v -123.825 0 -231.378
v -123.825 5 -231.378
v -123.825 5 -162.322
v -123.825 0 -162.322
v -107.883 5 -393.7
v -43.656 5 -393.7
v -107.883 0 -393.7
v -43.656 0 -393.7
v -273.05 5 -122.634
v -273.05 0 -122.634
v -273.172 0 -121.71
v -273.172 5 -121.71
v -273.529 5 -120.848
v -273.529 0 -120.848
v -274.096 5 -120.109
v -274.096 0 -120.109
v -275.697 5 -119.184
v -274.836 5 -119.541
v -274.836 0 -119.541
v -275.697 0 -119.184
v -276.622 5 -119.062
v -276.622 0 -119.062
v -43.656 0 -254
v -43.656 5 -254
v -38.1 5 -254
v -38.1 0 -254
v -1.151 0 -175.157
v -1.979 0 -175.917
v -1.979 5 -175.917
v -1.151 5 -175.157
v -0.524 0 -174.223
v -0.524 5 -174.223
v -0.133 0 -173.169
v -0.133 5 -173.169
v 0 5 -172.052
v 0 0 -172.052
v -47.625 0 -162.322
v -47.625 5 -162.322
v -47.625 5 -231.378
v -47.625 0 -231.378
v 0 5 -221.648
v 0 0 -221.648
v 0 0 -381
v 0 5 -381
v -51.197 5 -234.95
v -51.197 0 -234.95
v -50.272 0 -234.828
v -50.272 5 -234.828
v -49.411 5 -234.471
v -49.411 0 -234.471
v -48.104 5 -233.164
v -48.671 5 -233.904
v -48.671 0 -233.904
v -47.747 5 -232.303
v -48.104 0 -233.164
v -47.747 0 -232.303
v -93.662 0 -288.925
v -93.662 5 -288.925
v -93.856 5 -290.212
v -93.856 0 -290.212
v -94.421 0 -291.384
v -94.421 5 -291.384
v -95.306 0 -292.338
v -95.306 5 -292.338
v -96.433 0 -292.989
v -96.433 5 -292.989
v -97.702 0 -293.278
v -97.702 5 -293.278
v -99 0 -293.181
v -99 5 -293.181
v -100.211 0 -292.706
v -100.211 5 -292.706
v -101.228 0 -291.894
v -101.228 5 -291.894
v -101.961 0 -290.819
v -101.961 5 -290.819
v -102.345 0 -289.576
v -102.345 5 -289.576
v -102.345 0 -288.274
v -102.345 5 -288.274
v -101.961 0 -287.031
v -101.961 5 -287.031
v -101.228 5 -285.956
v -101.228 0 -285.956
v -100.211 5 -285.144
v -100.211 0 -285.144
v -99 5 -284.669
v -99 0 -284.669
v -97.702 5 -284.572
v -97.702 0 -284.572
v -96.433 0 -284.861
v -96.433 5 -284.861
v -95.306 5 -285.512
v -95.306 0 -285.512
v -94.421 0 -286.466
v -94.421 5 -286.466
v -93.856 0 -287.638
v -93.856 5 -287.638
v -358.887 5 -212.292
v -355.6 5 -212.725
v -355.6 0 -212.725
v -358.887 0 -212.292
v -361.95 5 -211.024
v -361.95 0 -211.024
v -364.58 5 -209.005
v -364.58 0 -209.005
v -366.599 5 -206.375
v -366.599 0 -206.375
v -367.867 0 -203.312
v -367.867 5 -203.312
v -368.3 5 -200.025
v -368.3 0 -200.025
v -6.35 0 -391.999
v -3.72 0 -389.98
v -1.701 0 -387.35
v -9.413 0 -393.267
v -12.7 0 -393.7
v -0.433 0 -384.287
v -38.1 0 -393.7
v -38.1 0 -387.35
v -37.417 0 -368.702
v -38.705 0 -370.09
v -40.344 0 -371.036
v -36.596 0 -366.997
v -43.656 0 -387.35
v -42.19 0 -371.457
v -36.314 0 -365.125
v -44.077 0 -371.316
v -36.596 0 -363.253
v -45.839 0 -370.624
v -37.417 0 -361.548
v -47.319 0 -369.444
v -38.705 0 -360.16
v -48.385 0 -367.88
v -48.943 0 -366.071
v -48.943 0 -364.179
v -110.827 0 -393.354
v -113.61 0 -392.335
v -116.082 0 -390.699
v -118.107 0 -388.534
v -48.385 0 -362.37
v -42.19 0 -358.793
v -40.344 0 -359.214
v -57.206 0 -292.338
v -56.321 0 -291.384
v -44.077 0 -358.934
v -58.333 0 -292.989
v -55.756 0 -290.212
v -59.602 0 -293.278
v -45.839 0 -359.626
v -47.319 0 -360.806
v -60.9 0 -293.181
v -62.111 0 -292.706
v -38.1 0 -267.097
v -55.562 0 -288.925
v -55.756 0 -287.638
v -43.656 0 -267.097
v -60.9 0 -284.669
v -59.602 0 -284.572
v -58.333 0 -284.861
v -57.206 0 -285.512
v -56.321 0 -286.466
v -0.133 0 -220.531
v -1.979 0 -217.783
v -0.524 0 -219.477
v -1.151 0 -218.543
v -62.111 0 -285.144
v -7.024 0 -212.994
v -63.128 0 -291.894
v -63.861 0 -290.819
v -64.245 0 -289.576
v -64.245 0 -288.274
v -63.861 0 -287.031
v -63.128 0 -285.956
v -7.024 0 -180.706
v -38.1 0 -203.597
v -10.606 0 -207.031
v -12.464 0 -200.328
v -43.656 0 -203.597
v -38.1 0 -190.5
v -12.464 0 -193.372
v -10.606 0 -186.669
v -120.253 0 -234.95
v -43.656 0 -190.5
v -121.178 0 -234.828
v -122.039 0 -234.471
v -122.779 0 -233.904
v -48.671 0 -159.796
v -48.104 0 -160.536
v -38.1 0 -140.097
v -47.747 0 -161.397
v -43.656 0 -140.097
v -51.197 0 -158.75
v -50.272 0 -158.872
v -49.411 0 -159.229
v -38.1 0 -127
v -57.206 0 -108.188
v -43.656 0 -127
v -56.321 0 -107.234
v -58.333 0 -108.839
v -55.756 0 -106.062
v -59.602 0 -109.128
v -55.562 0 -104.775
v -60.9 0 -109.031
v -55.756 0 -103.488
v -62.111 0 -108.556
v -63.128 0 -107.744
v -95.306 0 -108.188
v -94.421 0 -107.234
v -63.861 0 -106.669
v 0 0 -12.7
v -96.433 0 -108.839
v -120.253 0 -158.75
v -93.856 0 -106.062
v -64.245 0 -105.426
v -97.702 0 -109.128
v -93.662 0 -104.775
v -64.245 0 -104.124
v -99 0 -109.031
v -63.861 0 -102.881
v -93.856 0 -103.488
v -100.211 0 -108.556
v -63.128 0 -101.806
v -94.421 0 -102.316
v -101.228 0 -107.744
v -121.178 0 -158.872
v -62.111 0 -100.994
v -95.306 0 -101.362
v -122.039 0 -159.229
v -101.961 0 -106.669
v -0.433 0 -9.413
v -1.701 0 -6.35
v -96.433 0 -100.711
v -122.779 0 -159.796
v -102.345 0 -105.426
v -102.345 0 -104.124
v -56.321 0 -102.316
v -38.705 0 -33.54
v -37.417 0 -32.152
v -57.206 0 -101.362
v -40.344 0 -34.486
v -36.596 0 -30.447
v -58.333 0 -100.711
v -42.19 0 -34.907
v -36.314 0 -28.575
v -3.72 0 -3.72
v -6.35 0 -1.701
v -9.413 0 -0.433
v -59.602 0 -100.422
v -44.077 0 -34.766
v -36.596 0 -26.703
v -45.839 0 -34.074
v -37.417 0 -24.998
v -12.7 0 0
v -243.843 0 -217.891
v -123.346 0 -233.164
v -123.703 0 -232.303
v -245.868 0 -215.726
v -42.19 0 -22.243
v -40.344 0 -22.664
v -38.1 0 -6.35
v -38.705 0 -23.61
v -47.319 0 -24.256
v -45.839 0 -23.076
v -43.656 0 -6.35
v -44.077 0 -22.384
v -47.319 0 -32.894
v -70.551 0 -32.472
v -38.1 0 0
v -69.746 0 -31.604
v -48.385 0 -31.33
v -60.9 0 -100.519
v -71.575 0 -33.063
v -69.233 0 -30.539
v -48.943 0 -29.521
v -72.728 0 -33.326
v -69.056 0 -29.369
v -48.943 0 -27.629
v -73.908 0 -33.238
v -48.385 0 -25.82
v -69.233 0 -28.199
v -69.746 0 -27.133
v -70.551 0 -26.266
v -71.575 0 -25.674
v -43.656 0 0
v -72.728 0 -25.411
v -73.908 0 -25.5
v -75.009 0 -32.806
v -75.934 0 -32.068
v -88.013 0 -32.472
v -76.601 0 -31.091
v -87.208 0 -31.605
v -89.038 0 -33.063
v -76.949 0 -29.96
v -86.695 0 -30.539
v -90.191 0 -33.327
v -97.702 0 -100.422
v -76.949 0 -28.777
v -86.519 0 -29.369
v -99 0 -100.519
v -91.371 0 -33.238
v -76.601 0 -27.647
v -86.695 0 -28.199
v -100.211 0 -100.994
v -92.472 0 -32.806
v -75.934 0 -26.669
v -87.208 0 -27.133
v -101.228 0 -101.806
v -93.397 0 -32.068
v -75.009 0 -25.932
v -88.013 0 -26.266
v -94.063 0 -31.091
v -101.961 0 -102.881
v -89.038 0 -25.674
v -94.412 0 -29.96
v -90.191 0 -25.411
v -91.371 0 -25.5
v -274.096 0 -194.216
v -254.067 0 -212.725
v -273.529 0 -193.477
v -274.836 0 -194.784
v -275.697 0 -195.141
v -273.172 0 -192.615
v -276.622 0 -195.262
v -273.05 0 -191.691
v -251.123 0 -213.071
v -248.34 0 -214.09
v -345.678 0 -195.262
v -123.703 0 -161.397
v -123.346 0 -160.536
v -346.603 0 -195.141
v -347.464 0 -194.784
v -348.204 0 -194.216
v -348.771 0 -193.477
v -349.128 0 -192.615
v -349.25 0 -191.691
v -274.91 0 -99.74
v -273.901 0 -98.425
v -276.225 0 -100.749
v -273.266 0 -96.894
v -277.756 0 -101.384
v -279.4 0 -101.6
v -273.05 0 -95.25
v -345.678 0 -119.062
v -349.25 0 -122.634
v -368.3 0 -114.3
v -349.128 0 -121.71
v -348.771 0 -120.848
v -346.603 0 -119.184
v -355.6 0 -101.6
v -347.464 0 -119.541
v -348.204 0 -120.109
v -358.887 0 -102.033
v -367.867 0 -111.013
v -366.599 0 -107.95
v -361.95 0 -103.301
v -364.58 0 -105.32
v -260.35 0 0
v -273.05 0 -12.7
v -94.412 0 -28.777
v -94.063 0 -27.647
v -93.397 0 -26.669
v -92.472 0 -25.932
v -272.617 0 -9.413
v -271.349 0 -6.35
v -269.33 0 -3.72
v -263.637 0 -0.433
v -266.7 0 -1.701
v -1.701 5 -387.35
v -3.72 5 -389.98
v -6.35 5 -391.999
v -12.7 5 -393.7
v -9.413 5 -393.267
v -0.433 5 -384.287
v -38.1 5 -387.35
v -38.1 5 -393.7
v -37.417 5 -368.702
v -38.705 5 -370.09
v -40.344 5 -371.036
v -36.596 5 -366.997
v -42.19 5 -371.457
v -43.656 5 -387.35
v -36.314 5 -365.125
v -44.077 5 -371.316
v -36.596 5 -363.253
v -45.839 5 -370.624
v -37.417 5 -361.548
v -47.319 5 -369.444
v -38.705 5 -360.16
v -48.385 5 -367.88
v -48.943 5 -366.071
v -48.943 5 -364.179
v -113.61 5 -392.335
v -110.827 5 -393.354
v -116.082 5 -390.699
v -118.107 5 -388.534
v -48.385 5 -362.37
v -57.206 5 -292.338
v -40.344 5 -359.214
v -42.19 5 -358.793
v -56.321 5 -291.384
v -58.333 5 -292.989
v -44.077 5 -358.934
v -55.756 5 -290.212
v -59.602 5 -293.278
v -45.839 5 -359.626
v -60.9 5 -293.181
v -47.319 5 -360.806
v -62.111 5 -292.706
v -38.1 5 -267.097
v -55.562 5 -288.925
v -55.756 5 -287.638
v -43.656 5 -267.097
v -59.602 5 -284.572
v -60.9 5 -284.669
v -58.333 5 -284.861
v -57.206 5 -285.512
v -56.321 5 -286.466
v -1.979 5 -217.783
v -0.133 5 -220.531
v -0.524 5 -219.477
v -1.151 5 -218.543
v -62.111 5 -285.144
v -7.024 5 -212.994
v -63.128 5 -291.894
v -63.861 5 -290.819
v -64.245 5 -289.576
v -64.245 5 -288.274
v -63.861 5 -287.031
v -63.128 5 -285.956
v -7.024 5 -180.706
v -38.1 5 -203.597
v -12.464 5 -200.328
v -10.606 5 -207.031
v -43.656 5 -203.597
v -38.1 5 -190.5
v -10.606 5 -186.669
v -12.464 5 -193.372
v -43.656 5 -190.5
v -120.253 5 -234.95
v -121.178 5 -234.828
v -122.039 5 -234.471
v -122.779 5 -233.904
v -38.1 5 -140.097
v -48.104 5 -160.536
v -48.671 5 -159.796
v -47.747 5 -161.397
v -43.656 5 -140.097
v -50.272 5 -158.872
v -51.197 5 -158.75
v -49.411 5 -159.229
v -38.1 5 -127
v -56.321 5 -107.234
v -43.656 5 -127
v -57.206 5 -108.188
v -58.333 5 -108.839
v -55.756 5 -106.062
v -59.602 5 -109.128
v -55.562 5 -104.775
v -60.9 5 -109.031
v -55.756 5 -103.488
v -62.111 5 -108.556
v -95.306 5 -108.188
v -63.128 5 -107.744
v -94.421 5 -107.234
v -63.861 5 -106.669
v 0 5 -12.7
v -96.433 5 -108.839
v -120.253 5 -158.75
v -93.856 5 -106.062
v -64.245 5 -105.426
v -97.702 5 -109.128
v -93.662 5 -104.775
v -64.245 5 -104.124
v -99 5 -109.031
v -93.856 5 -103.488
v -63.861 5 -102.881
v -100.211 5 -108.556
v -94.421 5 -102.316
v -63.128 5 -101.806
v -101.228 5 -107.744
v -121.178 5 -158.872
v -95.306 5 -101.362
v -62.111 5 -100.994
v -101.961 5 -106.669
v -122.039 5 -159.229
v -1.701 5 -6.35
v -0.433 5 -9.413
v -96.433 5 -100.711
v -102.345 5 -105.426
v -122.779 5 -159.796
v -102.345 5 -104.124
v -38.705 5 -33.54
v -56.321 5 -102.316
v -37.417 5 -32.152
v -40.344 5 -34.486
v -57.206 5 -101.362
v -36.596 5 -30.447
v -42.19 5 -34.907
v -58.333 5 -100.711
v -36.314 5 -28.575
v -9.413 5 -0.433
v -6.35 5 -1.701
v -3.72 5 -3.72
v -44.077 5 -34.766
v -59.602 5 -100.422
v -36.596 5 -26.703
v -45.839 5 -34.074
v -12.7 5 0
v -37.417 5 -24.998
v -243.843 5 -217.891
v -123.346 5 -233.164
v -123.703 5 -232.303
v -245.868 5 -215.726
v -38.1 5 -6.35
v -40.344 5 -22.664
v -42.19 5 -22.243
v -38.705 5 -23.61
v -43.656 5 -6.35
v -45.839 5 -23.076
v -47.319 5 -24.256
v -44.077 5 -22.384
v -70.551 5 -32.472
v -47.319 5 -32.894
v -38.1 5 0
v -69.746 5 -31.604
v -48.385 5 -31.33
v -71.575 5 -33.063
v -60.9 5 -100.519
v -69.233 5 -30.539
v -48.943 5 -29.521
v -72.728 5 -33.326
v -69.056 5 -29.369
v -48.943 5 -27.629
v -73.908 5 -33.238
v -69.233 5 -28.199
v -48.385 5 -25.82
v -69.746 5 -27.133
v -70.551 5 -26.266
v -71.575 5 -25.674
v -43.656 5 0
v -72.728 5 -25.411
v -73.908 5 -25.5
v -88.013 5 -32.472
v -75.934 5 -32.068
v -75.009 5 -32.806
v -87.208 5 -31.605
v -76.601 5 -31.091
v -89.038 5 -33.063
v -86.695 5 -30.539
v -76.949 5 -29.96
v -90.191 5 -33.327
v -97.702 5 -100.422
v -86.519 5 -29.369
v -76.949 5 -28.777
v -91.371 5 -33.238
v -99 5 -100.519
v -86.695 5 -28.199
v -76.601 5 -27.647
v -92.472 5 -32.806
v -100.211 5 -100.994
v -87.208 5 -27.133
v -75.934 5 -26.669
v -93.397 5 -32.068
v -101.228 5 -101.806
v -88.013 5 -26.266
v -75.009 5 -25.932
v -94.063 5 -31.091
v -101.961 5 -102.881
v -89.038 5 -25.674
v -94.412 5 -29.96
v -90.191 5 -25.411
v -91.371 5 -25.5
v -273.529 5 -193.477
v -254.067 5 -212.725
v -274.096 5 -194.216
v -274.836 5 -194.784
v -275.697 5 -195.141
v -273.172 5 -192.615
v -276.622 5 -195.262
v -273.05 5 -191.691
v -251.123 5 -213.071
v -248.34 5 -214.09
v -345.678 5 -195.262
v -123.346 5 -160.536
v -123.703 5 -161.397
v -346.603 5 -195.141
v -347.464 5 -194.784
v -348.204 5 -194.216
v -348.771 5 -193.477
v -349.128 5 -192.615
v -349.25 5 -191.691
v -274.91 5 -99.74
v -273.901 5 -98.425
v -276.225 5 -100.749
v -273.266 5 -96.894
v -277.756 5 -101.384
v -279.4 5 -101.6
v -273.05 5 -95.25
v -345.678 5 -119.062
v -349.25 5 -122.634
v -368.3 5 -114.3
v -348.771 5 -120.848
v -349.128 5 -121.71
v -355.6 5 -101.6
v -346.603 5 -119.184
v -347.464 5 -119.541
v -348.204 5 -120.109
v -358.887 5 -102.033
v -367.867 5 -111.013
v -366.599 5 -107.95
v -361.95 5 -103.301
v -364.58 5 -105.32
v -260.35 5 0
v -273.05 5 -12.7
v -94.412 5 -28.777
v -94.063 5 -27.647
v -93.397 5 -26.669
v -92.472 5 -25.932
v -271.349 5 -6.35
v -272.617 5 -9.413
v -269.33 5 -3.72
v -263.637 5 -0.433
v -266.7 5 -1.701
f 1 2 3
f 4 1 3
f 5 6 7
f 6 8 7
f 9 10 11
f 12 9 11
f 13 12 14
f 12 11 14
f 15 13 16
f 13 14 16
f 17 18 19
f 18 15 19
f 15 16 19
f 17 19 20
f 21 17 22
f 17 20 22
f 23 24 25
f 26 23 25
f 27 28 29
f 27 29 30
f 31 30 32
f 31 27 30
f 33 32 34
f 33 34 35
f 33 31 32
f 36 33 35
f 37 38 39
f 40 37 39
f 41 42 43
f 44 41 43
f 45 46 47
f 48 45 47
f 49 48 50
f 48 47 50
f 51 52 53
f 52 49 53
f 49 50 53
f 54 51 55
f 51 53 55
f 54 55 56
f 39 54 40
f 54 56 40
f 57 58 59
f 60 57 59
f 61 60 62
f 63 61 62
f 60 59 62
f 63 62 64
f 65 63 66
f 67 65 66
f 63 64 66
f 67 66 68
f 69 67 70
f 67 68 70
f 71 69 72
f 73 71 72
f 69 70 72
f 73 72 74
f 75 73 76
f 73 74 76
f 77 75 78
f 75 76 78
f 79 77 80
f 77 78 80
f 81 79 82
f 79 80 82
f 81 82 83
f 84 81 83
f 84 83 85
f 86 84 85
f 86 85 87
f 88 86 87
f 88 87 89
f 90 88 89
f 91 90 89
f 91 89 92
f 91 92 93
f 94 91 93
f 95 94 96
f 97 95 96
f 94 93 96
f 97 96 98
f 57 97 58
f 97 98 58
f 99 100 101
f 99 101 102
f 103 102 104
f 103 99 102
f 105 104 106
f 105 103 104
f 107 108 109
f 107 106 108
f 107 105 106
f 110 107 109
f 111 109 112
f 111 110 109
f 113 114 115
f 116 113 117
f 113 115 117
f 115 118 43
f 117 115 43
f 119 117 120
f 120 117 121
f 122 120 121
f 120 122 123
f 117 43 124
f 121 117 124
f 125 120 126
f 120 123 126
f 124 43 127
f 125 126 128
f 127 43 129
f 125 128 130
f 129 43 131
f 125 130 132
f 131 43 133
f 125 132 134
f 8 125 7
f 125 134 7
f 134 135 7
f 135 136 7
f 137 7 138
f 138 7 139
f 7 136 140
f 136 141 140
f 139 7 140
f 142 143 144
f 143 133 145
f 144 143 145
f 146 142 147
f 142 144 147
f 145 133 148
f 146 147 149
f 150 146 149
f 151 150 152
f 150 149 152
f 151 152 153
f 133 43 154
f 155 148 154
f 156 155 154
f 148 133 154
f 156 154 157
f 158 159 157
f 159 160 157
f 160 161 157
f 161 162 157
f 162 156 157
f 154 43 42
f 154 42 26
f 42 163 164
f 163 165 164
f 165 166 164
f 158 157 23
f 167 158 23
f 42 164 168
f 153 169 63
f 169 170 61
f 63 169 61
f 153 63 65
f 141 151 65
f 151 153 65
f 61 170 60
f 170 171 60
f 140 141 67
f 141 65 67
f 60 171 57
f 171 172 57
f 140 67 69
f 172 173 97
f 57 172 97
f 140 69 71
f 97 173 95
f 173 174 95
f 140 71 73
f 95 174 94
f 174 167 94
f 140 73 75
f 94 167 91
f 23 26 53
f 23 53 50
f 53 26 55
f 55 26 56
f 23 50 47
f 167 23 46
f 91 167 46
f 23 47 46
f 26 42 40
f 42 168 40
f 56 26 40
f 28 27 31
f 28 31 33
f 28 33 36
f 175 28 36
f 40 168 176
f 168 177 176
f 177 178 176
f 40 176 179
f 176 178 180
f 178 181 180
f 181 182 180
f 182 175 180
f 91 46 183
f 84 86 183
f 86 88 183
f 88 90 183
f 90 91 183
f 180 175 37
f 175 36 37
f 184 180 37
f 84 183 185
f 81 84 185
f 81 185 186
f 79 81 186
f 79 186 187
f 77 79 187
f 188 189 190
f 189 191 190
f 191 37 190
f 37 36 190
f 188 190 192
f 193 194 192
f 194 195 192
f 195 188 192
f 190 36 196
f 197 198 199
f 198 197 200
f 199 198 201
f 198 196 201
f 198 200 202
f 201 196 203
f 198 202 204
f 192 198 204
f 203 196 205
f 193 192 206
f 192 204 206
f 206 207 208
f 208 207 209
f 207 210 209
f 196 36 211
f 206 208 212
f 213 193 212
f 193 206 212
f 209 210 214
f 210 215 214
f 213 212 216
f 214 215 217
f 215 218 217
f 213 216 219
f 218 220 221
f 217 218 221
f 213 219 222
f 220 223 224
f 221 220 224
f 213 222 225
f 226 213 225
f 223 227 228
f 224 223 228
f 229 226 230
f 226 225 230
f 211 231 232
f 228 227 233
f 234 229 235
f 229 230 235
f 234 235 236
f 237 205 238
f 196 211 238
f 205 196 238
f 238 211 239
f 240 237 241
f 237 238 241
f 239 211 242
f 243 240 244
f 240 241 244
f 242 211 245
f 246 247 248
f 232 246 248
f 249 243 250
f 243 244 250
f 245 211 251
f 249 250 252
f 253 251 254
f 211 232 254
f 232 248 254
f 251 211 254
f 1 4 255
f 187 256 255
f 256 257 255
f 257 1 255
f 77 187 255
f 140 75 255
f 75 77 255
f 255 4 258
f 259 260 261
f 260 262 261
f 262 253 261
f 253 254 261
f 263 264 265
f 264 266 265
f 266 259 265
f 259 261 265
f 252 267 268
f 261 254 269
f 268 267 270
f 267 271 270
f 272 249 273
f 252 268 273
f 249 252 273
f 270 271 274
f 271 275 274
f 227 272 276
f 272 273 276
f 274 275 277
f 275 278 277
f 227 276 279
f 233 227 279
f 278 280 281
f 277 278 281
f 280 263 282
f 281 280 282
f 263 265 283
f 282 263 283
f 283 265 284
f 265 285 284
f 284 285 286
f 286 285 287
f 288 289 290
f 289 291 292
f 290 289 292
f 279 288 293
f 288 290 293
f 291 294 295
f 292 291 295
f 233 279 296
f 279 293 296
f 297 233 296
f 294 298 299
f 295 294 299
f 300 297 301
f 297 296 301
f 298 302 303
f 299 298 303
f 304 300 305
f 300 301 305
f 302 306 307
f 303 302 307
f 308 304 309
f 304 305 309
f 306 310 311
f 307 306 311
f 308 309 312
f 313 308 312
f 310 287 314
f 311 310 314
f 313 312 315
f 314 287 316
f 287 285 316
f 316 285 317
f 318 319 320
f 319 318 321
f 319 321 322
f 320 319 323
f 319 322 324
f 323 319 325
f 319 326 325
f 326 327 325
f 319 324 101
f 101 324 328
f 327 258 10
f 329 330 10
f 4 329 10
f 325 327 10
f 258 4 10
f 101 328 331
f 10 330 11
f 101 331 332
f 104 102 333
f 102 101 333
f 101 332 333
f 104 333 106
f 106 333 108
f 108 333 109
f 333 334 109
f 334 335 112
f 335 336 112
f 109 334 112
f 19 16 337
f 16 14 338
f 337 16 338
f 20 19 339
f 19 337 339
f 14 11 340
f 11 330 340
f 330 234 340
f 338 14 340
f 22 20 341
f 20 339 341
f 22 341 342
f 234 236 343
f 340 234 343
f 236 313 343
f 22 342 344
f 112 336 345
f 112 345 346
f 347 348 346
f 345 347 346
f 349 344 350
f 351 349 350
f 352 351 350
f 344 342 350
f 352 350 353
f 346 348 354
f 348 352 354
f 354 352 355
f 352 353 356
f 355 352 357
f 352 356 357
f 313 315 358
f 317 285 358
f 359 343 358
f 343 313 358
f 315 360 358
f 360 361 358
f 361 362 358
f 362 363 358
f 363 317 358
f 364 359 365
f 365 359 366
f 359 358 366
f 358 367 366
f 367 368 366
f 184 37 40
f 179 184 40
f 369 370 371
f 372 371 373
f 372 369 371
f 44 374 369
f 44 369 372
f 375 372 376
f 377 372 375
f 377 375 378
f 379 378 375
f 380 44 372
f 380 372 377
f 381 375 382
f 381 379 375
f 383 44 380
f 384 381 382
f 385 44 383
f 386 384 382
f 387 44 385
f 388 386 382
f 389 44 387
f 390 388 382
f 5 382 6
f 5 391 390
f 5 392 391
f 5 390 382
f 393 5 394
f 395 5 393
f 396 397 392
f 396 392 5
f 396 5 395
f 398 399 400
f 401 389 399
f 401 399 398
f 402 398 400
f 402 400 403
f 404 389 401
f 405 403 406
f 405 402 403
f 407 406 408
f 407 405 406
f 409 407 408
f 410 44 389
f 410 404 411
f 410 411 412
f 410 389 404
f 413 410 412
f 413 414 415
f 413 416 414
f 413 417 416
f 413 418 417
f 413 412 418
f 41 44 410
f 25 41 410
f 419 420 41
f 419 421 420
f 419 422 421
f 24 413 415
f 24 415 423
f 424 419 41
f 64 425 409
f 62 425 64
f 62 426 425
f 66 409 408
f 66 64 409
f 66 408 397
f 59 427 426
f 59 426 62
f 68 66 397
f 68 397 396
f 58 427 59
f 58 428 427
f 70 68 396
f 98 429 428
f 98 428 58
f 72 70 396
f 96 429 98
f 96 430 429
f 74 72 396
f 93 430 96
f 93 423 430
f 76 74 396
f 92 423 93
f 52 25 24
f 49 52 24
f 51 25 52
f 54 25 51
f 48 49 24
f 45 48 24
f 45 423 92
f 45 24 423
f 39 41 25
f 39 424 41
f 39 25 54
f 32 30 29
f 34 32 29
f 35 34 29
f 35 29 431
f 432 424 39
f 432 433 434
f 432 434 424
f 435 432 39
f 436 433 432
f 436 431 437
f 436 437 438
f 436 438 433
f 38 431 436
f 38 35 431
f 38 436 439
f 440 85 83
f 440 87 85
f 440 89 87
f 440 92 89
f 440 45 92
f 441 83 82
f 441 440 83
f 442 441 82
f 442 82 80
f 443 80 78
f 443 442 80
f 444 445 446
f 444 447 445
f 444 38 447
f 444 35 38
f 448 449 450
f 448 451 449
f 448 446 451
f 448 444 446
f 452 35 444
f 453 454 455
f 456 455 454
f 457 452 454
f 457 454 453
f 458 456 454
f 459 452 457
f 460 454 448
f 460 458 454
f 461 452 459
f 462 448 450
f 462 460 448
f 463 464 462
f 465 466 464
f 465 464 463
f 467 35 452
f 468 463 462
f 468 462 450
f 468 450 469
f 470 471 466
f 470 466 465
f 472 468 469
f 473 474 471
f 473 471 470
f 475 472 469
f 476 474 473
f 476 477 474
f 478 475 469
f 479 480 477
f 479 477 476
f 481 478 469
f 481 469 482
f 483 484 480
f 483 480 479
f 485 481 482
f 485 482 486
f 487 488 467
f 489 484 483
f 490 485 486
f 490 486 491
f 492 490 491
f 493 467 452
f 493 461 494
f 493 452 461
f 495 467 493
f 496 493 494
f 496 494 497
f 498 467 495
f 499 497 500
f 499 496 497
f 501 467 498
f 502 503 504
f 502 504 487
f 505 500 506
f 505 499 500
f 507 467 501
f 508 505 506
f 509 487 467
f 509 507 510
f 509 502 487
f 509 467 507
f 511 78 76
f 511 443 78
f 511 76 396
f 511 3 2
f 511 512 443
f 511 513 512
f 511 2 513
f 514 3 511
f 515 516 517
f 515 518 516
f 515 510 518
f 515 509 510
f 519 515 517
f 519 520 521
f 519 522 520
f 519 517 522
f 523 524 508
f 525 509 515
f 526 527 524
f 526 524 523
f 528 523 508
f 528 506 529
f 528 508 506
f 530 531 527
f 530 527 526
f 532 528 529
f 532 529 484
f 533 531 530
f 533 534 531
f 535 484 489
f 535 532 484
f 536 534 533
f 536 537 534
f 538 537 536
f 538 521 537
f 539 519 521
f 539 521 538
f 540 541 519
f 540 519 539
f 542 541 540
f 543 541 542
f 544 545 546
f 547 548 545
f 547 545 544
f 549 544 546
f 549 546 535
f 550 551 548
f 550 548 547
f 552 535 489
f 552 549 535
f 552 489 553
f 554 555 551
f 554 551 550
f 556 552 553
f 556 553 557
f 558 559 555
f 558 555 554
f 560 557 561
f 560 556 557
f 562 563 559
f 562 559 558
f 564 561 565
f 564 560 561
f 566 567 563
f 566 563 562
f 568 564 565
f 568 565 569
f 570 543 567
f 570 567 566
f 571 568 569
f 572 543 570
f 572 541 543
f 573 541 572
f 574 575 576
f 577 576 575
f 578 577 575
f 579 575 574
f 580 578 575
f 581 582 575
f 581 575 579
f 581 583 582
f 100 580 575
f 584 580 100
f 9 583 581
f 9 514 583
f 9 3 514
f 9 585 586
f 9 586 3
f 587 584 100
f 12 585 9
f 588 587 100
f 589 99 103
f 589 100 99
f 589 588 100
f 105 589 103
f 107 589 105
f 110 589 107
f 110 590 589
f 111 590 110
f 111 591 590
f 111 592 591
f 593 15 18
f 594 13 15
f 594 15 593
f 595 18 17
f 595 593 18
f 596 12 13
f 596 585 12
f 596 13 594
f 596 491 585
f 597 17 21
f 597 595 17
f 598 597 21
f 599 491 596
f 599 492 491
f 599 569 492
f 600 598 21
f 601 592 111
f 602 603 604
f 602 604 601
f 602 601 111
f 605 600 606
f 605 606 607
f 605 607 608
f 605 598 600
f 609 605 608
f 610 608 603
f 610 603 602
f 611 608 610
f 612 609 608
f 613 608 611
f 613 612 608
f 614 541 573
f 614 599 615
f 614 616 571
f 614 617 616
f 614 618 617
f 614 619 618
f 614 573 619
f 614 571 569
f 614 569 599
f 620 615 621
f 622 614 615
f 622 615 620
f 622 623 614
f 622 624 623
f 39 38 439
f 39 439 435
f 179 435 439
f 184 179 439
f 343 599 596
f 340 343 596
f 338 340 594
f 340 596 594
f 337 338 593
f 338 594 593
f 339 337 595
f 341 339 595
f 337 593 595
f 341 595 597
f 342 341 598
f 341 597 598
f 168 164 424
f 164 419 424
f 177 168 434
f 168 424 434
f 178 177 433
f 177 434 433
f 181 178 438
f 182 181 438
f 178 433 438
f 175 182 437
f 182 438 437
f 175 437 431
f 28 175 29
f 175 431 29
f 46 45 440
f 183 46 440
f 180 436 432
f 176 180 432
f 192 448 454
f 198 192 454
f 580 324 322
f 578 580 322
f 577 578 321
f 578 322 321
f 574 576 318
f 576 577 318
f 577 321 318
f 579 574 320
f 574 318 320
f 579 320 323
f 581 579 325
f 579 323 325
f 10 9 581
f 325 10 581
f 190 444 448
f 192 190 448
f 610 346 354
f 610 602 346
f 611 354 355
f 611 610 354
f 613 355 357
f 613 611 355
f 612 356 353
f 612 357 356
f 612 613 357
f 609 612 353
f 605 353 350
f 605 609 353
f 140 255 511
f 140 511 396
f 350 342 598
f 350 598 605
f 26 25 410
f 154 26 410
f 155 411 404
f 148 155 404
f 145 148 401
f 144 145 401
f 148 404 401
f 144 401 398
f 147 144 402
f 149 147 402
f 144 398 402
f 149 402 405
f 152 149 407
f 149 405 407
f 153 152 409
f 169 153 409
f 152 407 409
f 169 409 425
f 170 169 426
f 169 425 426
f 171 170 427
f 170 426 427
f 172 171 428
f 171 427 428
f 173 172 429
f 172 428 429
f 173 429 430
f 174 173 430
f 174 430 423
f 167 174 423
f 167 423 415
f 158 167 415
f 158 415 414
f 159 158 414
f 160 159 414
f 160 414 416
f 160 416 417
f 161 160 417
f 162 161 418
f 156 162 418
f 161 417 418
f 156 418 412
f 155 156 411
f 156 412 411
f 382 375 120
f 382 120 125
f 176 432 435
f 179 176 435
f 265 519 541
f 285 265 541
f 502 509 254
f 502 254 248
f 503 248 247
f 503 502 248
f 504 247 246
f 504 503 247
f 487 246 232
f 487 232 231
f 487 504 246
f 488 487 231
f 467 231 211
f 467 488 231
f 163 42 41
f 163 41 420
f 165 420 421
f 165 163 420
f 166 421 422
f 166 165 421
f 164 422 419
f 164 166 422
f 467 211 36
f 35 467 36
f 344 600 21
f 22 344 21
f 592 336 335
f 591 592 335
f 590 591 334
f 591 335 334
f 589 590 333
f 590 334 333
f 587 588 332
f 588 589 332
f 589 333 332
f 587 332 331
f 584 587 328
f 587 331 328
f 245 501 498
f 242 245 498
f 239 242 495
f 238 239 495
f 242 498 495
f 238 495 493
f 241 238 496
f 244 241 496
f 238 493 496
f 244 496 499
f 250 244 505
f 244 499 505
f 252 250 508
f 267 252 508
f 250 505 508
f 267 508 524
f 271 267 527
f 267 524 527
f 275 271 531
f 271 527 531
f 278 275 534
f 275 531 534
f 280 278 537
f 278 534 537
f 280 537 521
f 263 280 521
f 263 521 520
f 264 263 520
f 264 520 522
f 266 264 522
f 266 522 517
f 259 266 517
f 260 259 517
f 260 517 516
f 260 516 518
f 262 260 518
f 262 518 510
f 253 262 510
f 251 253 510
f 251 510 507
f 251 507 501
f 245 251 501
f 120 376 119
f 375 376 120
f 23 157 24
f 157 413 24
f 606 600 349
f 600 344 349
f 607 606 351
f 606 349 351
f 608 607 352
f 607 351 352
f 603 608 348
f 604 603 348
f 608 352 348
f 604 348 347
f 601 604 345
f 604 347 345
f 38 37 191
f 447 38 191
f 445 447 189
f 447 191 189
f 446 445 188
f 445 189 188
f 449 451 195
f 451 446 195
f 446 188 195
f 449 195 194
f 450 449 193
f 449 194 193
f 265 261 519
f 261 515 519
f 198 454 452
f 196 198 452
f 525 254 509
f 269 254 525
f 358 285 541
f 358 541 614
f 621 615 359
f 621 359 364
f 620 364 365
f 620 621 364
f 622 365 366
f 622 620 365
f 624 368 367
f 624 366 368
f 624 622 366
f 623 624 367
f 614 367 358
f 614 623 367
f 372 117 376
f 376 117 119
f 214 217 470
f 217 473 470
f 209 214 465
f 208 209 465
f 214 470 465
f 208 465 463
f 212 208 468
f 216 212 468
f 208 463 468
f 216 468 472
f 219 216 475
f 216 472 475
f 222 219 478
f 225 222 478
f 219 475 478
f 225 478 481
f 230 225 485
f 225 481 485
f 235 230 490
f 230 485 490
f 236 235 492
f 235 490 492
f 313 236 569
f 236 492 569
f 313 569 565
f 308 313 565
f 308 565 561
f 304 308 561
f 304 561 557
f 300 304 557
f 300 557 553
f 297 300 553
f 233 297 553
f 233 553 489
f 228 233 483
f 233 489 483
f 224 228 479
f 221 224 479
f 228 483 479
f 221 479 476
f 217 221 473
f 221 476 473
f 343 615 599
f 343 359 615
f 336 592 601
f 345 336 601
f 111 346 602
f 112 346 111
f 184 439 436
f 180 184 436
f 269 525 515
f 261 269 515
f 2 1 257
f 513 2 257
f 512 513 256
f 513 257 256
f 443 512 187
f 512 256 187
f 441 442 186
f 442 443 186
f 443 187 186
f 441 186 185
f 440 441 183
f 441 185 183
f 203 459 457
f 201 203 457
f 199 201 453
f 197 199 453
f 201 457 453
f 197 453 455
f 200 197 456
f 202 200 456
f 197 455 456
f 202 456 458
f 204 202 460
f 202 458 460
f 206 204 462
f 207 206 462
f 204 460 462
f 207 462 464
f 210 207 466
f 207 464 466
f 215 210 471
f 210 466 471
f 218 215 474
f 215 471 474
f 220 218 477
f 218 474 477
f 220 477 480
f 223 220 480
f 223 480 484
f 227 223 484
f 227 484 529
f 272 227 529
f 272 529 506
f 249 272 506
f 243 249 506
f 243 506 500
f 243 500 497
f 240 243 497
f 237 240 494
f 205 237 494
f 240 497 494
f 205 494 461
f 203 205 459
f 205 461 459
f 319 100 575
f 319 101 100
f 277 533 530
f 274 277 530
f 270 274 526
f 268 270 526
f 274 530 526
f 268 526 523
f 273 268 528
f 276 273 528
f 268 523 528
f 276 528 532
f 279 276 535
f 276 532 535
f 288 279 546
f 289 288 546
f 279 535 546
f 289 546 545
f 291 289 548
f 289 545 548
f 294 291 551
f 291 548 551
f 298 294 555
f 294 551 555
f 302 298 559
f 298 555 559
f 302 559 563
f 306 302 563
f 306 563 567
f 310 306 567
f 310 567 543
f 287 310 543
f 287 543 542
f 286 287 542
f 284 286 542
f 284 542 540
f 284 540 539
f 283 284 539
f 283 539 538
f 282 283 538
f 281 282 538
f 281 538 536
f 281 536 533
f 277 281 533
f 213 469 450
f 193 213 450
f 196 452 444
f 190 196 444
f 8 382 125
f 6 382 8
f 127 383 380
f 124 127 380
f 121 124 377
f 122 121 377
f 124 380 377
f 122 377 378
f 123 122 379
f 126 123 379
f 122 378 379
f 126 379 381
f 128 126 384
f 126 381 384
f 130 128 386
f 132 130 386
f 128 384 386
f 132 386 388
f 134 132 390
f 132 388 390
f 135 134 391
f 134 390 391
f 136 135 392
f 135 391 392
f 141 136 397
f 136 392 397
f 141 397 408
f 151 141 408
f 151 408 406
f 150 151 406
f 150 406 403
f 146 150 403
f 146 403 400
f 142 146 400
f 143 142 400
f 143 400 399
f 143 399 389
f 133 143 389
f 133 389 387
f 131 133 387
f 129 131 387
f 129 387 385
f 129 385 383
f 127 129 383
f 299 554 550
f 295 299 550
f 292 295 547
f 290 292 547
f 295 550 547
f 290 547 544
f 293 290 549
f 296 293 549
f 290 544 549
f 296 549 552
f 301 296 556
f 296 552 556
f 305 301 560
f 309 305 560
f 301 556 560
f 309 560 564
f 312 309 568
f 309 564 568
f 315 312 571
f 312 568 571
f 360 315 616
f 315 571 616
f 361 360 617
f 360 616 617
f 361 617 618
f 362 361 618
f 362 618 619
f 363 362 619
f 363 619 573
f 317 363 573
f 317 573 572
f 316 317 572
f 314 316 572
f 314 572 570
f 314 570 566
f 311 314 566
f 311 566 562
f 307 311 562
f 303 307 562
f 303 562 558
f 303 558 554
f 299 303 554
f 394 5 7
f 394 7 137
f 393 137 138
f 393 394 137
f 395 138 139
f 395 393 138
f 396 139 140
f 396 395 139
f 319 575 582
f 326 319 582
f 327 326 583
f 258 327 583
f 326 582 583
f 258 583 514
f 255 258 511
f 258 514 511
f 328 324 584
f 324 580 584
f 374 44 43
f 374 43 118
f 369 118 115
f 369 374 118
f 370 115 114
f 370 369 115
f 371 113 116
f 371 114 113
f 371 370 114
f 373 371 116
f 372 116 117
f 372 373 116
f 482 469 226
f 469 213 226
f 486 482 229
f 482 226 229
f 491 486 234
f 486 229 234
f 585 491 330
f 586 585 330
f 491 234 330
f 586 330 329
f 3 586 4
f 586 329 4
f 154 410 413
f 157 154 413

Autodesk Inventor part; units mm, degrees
ref_plane "YZ Plane" through (0, 0, 0) normal (1, 0, 0) x (0, 1, 0)
ref_plane "XZ Plane" through (0, 0, 0) normal (0, 1, 0) x (-1, 0, 0)
ref_plane "XY Plane" through (0, 0, 0) normal (0, 0, 1) x (1, 0, 0)
sketch "Boceto1" plane through (0, 0, 0) normal (0, 1, 0) x (-1, 0, 0)
  line L0 (0, 0) -> (273.05, 0)
  line L1 (273.05, 0) -> (273.05, -101.6)
  line L2 (273.05, -101.6) -> (368.3, -101.6)
  line L3 (368.3, -101.6) -> (368.3, -212.725)
  line L4 (0, 0) -> (0, -393.7)
  line L5 (0, -393.7) -> (114.3, -393.7)
  line L6 (368.3, -212.725) -> (247.65, -212.725)
  line L7 (247.65, -212.725) -> (114.3, -393.7)
  dimension "d0" = 273.05
  dimension "d1" = 101.6
  dimension "d2" = 95.25
  dimension "d3" = 111.125
  dimension "d4" = 393.7
  dimension "d50" = 114.3
  dimension "d51" = 133.35
extrude "Extrusión1" add sketch "Boceto1" along normal blind 5
fillet "Empalme1" radius 12.7 7 edges at (-368.3, 2.5, -101.6) (-273.05, 2.5, 0) (-368.3, 2.5, -212.725) (-247.65, 2.5, -212.725) (-114.3, 2.5, -393.7) (0, 2.5, -393.7) (0, 2.5, 0)
fillet "Empalme2" radius 6.35 1 edges at (-273.05, 2.5, -101.6)
sketch "Boceto2" plane through (0, 5, 0) normal (0, 1, 0) x (1, 0, 0)
  line L0 (-349.25, 119.0625) -> (-273.05, 119.0625)
  line L1 (-273.05, 119.0625) -> (-273.05, 195.2625)
  line L2 (-273.05, 195.2625) -> (-349.25, 195.2625)
  line L3 (-349.25, 195.2625) -> (-349.25, 119.0625)
  line L4 (-368.3, 200.025) -> (-368.3, 114.3) projected
  line L5 (-254.0674, 212.725) -> (-355.6, 212.725) projected
  line L6 (-355.6, 101.6) -> (-279.4, 101.6) projected
  line L7 (-260.35, 0) -> (-12.7, 0) projected
  line L8 (-43.6563, 0) -> (-38.1, 0)
  line L9 (-38.1, 0) -> (-38.1, 6.35)
  line L10 (-38.1, 6.35) -> (-43.6562, 6.35)
  line L11 (-43.6562, 6.35) -> (-43.6563, 0)
  line L12 (-12.7, 393.7) -> (-107.8826, 393.7) projected
  line L13 (0, 12.7) -> (0, 381) projected
  circle A0 centre (-98.0281, 104.775) radius 4.3656
  circle A1 centre (-59.9281, 104.775) radius 4.3656
  circle A2 centre (-98.0281, 288.925) radius 4.3656
  circle A3 centre (-59.9281, 288.925) radius 4.3656
  line L14 (-123.825, 158.75) -> (-47.625, 158.75)
  line L15 (-47.625, 158.75) -> (-47.625, 234.95)
  line L16 (-47.625, 234.95) -> (-123.825, 234.95)
  line L17 (-123.825, 234.95) -> (-123.825, 158.75)
  circle A4 centre (-42.6641, 365.125) radius 6.35
  circle A5 centre (-42.6641, 28.575) radius 6.35
  line L18 (-107.8826, 393.7) -> (-12.7, 393.7) projected
  line L19 (-43.6563, 393.7) -> (-38.1, 393.7)
  line L20 (-38.1, 393.7) -> (-38.1, 387.35)
  line L21 (-38.1, 387.35) -> (-43.6563, 387.35)
  line L22 (-43.6563, 387.35) -> (-43.6563, 393.7)
  line L23 (-43.6563, 127) -> (-38.1, 127)
  line L24 (-38.1, 127) -> (-38.1, 140.0969)
  line L25 (-38.1, 140.0969) -> (-43.6563, 140.0969)
  line L26 (-43.6563, 140.0969) -> (-43.6563, 127)
  line L27 (-43.6563, 190.5) -> (-38.1, 190.5)
  line L28 (-38.1, 190.5) -> (-38.1, 203.5969)
  line L29 (-38.1, 203.5969) -> (-43.6563, 203.5969)
  line L30 (-43.6563, 203.5969) -> (-43.6563, 190.5)
  line L31 (-43.6563, 254) -> (-38.1, 254)
  line L32 (-38.1, 254) -> (-38.1, 267.0969)
  line L33 (-38.1, 267.0969) -> (-43.6563, 267.0969)
  line L34 (-43.6563, 267.0969) -> (-43.6563, 254)
  circle A6 centre (-73.025, 29.3688) radius 3.9687
  circle A7 centre (-90.4875, 29.3688) radius 3.9688
  point P0 (0, 0)
  dimension "d11" = 76.2
  dimension "d17" = 17.4625
  dimension "d18" = 19.05
  dimension "d19" = 76.2
  dimension "d20" = 5.5563
  dimension "d22" = 6.35
  dimension "d24" = 38.1
  dimension "d27" = 8.7312
  dimension "d38" = 76.2
  dimension "d39" = 76.2
  dimension "d40" = 158.75
  dimension "d42" = 12.7
  dimension "d43" = 28.575
  dimension "d44" = 42.6641
  dimension "d47" = 12.7
  dimension "d52" = 38.1
  dimension "d53" = 5.5563
  dimension "d54" = 6.35
  dimension "d55" = 47.625
  dimension "d56" = 8.7312
  dimension "d57" = 98.0281
  dimension "d58" = 38.1
  dimension "d59" = 53.975
  dimension "d60" = 53.975
  dimension "d61" = 184.15
  dimension "d62" = 184.15
  dimension "d63" = 38.1
  dimension "d64" = 8.7312
  dimension "d65" = 8.7312
  dimension "d66" = 98.0281
  dimension "d67" = 42.6641
  dimension "d68" = 28.575
  dimension "d69" = 5.5563
  dimension "d70" = 5.5563
  dimension "d71" = 5.5563
  dimension "d72" = 13.0969
  dimension "d73" = 13.0969
  dimension "d74" = 13.0969
  dimension "d75" = 38.1
  dimension "d80" = 63.5
  dimension "d81" = 63.5
  dimension "d82" = 127
  dimension "d92" = 7.9375
  dimension "d93" = 7.9375
  dimension "d94" = 25.4
  dimension "d96" = 25.4
  dimension "d97" = 25.4
  dimension "d98" = 25.4
extrude "Extrusión2" cut sketch "Boceto2" against normal up to next
fillet "Empalme3" radius 3.5719 8 edges at (-349.25, 2.5, -119.0625) (-123.825, 2.5, -158.75) (-349.25, 2.5, -195.2625) (-123.825, 2.5, -234.95) (-273.05, 2.5, -195.2625) (-47.625, 2.5, -234.95) (-273.05, 2.5, -119.0625) (-47.625, 2.5, -158.75)
sketch "Boceto3" plane through (0, 5, 0) normal (0, 1, 0) x (1, 0, 0)
  line L0 (0, 12.7) -> (0, 381) projected
  line L1 (0, 381) -> (0, 12.7) projected
  line L2 (0, 196.85) -> (-12.7, 196.85)
  line L3 (0, 196.85) -> (0, 219.075)
  line L4 (0, 196.85) -> (0, 174.625)
  arc A0 (0, 219.075) -> (0, 174.625) centre (13.0969, 196.85) ccw
  point P0 (0, 0)
  dimension "d86" = 12.7
  dimension "d87" = 22.225
  dimension "d88" = 22.225
extrude "Extrusión3" cut sketch "Boceto3" against normal up to next
fillet "Empalme4" radius 4.7625 2 edges at (0, 2.5, -219.075) (0, 2.5, -174.625)
equation "\"d42\" = UBD"
equation "\"d47\" = UBD"
equation "\"LM\" = 76.2"
equation "\"UBD\" = 12.7"
properties part number "CAR SIDE PLATE I"
